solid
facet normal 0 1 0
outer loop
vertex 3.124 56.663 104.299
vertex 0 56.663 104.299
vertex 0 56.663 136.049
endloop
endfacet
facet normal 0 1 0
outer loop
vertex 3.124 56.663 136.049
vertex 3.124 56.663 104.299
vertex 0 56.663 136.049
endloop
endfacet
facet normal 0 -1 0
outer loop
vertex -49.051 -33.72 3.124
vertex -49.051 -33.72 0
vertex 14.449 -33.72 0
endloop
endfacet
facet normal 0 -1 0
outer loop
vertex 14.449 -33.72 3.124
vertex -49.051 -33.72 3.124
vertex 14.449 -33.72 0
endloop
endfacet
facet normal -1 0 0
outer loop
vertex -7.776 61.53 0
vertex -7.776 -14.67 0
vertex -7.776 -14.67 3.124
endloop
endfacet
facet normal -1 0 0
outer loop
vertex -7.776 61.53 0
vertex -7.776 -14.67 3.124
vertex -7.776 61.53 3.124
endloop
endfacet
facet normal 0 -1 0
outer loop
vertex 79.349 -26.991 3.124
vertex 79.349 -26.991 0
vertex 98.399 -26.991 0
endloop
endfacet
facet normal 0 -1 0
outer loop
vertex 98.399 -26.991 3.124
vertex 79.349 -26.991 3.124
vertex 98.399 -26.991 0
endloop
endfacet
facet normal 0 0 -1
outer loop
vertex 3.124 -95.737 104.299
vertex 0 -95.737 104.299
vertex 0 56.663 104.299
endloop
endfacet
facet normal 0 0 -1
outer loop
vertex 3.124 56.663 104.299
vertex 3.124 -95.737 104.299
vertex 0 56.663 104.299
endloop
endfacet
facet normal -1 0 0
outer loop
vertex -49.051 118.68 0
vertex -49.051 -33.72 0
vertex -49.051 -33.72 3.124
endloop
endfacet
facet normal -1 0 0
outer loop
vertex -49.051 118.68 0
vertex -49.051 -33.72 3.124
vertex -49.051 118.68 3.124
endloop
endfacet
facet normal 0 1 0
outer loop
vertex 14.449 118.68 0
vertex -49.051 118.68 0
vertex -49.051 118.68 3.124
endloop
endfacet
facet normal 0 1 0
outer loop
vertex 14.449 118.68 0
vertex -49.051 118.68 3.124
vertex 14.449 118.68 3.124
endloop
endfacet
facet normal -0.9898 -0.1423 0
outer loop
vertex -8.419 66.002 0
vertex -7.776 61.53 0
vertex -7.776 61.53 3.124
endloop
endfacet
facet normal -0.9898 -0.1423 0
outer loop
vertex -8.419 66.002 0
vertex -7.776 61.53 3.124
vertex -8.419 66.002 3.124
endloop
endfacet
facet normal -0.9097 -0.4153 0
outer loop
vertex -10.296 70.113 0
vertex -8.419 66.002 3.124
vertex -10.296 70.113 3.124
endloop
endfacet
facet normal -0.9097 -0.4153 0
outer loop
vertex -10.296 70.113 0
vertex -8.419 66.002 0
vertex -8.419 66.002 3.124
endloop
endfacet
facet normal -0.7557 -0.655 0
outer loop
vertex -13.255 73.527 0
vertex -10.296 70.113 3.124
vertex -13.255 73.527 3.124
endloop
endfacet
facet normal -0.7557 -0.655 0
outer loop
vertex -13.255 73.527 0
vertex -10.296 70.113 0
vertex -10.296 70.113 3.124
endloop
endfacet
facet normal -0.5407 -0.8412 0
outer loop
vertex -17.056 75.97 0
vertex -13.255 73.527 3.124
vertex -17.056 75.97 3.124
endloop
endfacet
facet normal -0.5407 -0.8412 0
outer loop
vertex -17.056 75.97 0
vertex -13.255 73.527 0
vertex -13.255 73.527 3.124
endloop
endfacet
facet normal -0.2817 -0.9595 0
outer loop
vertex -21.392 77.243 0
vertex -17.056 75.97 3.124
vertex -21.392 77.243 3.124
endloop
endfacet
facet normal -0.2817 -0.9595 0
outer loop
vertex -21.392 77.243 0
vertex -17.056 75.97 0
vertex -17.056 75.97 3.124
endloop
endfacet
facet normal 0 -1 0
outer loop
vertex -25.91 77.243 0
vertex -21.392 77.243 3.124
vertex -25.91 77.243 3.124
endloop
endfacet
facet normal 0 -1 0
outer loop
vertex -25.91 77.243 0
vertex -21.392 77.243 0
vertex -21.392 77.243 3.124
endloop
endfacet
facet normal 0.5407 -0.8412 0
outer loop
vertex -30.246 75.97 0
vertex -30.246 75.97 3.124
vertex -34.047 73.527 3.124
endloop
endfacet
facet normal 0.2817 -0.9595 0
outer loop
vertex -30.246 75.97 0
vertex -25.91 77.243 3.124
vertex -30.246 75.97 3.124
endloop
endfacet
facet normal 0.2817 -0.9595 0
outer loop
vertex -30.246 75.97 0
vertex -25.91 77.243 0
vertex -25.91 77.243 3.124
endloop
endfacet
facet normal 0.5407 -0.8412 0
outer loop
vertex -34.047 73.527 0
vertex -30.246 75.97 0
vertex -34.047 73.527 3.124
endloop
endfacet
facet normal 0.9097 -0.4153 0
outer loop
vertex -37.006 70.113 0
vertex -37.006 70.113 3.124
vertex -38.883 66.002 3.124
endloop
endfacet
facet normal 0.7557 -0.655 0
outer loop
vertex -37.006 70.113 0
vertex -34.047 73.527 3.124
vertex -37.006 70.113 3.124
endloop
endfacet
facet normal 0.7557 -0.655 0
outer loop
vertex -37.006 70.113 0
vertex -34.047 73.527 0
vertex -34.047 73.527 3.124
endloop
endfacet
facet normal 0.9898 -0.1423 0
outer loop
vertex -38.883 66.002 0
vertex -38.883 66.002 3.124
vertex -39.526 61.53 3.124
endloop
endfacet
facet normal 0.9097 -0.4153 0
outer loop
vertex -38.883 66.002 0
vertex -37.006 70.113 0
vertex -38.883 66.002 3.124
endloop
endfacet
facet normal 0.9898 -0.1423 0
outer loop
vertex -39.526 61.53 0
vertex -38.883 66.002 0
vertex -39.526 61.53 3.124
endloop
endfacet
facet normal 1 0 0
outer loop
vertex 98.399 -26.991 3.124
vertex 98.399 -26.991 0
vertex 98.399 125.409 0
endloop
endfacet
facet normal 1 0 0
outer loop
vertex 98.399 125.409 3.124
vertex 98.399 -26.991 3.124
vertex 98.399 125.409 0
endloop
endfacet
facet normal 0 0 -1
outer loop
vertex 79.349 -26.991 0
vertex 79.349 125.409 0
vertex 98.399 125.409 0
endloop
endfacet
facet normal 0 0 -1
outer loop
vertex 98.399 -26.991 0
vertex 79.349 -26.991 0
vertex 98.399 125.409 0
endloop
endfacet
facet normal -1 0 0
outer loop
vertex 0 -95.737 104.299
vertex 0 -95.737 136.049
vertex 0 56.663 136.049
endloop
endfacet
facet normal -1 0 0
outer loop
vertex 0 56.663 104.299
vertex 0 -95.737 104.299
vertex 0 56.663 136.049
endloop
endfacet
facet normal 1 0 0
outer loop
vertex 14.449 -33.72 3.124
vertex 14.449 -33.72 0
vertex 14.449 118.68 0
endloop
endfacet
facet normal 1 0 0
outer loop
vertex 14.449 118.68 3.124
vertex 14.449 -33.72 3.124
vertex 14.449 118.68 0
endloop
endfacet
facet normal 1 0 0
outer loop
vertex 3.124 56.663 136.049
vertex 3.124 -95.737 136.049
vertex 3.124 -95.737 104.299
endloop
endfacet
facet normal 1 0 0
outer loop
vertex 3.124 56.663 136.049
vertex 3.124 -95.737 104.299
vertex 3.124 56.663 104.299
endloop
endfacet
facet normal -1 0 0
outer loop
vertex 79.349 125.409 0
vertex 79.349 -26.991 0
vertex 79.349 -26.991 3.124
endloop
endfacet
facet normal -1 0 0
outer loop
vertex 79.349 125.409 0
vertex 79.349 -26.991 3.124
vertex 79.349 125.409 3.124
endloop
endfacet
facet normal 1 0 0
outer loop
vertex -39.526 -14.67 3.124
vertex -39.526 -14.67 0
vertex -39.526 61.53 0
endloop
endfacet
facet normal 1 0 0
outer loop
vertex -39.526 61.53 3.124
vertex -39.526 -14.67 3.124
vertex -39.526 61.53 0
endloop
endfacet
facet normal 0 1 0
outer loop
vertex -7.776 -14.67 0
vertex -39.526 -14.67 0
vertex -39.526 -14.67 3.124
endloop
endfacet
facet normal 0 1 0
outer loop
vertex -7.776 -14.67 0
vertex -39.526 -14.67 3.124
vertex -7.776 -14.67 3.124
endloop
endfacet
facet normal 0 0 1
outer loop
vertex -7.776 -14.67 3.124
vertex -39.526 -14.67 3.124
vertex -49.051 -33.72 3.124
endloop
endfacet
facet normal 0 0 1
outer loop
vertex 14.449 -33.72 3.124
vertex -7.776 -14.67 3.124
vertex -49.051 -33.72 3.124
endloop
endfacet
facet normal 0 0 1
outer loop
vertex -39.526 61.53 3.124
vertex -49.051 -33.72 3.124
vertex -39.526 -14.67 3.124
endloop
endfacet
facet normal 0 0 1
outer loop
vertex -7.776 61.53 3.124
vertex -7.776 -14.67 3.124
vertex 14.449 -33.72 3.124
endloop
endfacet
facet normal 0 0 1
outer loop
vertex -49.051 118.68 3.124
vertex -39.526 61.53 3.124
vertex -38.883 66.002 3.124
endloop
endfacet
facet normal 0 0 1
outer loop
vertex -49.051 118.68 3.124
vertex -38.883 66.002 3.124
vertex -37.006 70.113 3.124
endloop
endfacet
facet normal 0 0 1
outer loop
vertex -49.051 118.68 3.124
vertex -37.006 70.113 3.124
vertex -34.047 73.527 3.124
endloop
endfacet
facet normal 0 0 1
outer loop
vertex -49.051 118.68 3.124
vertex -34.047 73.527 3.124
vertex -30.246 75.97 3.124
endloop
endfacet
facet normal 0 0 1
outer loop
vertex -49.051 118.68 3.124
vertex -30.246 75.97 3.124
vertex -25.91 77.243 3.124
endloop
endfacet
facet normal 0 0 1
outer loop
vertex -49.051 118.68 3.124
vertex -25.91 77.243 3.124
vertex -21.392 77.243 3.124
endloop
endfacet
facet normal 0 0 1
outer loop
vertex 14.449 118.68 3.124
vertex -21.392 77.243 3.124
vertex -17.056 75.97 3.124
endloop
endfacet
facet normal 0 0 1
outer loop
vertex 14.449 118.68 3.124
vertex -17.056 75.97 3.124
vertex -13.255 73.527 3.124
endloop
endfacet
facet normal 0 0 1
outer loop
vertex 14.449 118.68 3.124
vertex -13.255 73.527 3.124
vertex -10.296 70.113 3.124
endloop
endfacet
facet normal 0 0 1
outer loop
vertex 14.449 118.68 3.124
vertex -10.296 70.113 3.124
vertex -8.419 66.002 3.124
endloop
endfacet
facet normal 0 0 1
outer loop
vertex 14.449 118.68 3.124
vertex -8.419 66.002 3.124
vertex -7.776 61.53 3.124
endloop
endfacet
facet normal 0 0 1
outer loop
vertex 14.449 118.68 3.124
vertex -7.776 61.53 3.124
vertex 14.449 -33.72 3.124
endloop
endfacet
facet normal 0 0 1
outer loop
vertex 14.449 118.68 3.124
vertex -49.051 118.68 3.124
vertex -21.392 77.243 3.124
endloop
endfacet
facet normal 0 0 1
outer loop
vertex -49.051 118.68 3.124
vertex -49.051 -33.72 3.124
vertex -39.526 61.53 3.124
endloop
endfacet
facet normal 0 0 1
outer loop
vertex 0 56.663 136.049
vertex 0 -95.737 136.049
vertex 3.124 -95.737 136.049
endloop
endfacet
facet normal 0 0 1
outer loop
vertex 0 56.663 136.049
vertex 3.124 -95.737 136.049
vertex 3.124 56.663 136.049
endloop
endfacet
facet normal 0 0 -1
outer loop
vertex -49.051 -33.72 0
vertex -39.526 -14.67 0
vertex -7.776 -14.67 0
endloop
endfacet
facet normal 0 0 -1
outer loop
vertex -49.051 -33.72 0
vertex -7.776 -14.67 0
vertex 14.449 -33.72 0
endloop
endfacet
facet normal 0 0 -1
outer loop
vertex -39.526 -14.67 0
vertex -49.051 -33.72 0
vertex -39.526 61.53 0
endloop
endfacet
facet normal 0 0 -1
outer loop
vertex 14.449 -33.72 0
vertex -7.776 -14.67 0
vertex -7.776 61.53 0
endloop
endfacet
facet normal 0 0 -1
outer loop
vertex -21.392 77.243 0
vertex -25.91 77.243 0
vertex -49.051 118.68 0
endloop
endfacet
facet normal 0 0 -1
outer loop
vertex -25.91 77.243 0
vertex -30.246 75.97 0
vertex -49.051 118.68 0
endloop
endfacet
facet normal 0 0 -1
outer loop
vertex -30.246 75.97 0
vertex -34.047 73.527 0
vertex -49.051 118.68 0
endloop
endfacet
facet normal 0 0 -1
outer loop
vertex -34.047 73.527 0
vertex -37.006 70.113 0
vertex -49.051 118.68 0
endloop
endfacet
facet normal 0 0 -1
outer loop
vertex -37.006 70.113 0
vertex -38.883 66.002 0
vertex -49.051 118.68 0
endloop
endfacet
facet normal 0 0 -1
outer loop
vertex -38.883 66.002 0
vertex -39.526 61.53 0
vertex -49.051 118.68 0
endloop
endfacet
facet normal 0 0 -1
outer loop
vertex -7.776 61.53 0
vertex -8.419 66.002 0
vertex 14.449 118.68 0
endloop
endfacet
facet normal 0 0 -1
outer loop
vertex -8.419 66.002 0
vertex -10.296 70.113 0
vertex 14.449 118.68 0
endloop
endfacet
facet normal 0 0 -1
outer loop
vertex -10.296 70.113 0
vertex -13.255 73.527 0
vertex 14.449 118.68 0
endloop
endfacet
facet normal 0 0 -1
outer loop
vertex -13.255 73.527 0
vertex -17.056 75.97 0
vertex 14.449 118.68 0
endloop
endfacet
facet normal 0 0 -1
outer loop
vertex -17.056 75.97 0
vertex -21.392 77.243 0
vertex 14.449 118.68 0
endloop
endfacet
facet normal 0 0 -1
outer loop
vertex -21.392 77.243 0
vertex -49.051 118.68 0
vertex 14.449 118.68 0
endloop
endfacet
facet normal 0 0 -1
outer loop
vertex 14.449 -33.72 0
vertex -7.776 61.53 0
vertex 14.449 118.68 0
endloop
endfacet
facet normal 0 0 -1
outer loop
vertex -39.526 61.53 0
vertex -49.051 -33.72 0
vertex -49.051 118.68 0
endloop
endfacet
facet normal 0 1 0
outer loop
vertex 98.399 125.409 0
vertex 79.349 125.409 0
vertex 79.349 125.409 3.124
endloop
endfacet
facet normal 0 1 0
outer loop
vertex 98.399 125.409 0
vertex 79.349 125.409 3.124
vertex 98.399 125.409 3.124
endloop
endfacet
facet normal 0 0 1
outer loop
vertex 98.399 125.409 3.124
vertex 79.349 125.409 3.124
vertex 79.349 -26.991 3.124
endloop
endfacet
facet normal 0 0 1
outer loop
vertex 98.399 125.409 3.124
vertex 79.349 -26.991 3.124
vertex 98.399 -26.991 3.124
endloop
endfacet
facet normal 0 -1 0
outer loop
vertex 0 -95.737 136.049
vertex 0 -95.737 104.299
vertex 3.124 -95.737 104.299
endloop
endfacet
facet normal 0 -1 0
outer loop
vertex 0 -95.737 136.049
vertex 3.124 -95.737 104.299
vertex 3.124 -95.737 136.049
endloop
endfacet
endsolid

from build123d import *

# Parameters (mm, degrees)
F0_W     = 63.5
F0_H     = 152.4
F2_DEPTH = 3.1242
F1_W     = 31.75
F1_H     = 76.2
F3_DEPTH = 25.4
F4_R     = 15.875
F5_DEPTH = 25.4
F6_W     = 19.05
F6_H     = 152.4
F7_DEPTH = 3.1242
F8_W     = 152.4
F8_H     = 31.75
F9_DEPTH = 3.1242


with BuildPart() as f2:
    # F0 (on Top) → F2 (new body)
    with BuildSketch(Plane.XY):
        with Locations((-17.301103, 42.479957)):
            Rectangle(F0_W, F0_H)
    extrude(amount=F2_DEPTH)

    # F1 (on Top) → F3 (cut)
    with BuildSketch(Plane.XY):
        with Locations((-23.651103, 23.429957)):
            Rectangle(F1_W, F1_H)
    extrude(amount=F3_DEPTH, mode=Mode.SUBTRACT)

    # F4 (on Top) → F5 (cut)
    with BuildSketch(Plane.XY):
        with Locations((-23.651103, 61.529957)):
            Circle(F4_R)
    extrude(amount=F5_DEPTH, mode=Mode.SUBTRACT)


with BuildPart() as f7:
    # F6 (on Top) → F7 (new body)
    with BuildSketch(Plane.XY):
        with Locations((88.873714, 49.208982)):
            Rectangle(F6_W, F6_H)
    extrude(amount=F7_DEPTH)


with BuildPart() as f9:
    # F8 (on Right) → F9 (new body)
    with BuildSketch(Plane.YZ):
        with Locations((-19.53739, 120.174374)):
            Rectangle(F8_W, F8_H)
    extrude(amount=F9_DEPTH)


solid = Compound([f2.part, f7.part, f9.part])
